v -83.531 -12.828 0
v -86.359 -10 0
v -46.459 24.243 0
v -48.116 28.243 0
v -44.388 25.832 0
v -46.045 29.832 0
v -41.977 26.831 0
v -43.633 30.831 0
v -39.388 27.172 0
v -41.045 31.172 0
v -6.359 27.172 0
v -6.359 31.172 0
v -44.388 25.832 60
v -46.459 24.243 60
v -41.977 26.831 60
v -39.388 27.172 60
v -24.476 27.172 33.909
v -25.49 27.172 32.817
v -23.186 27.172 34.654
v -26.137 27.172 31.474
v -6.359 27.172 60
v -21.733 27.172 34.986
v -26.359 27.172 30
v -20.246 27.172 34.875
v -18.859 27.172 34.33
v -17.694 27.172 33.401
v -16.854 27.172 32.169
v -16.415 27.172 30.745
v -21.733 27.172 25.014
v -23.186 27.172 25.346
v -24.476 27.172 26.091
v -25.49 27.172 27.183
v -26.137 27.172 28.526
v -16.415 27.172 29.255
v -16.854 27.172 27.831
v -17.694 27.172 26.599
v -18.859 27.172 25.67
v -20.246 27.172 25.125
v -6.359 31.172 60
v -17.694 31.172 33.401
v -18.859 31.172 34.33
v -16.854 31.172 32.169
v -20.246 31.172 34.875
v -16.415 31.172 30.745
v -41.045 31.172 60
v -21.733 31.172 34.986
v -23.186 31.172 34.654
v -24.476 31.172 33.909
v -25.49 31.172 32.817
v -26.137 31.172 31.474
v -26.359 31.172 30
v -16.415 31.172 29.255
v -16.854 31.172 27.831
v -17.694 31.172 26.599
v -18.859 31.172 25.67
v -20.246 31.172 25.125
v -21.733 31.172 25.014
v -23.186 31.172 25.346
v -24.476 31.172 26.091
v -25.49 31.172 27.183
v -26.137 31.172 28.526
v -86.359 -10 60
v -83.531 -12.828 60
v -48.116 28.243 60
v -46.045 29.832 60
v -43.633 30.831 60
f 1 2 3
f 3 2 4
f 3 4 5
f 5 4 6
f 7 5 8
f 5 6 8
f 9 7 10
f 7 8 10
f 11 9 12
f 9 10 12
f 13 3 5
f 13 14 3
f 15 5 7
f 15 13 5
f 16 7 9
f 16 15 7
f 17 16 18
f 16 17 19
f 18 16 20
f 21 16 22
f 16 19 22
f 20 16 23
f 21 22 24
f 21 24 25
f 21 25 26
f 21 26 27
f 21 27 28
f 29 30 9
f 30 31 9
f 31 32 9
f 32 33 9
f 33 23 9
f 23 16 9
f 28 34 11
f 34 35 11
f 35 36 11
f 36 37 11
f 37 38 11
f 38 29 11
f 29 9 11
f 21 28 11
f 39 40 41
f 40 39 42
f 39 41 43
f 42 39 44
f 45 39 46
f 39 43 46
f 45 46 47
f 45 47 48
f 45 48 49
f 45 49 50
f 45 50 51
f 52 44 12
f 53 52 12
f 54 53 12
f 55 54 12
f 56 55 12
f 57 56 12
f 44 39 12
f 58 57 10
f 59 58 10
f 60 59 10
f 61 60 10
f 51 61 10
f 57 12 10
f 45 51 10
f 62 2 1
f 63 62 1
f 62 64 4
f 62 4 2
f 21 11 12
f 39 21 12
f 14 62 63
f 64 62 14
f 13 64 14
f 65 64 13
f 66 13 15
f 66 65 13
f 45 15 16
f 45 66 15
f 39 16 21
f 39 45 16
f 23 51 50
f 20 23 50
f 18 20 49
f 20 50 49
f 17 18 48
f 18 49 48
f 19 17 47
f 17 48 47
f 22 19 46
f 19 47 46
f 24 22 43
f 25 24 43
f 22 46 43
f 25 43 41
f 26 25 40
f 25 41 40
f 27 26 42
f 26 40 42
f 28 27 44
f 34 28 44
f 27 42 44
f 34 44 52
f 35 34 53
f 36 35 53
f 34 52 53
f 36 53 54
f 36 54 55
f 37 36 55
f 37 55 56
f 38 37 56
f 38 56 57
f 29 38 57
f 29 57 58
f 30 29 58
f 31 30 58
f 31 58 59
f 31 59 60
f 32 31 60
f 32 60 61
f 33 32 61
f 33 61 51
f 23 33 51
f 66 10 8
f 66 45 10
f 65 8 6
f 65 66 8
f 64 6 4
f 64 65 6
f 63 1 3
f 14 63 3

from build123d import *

# Parameters (mm, degrees)
BOSS_EXTRUDE1_DEPTH = 60
FILLET1_R           = 10
SKETCH2_R           = 5
CUT_EXTRUDE1_DEPTH  = 60


with BuildPart() as part:
    # Sketch1 → Boss-Extrude1 (new body)
    with BuildSketch(Plane.XY):
        Polygon((-86.358974359, -10), (-83.530547234, -12.828427125), (-43.530547234, 27.171572875), (-6.358974359, 27.171572875), (-6.358974359, 31.171572875), (-45.187401484, 31.171572875), align=None)
    extrude(amount=BOSS_EXTRUDE1_DEPTH)

    # Fillet1
    fillet1_edges = [part.edges().sort_by_distance(p)[0] for p in [
        (-45.187401484, 31.171572875, 30),
        (-43.530547234, 27.171572875, 30),
    ]]
    fillet(fillet1_edges, radius=FILLET1_R)

    # Sketch2 → Cut-Extrude1 (cut)
    with BuildSketch(Plane(origin=(0, 31.171572875, 0), x_dir=(1, 0, 0), z_dir=(0, 1, 0))):
        with Locations(Location((-21.358974359, -30, 0), (0, 0, 180))):
            Circle(SKETCH2_R)
    extrude(amount=-CUT_EXTRUDE1_DEPTH, mode=Mode.SUBTRACT)


solid = part.part
